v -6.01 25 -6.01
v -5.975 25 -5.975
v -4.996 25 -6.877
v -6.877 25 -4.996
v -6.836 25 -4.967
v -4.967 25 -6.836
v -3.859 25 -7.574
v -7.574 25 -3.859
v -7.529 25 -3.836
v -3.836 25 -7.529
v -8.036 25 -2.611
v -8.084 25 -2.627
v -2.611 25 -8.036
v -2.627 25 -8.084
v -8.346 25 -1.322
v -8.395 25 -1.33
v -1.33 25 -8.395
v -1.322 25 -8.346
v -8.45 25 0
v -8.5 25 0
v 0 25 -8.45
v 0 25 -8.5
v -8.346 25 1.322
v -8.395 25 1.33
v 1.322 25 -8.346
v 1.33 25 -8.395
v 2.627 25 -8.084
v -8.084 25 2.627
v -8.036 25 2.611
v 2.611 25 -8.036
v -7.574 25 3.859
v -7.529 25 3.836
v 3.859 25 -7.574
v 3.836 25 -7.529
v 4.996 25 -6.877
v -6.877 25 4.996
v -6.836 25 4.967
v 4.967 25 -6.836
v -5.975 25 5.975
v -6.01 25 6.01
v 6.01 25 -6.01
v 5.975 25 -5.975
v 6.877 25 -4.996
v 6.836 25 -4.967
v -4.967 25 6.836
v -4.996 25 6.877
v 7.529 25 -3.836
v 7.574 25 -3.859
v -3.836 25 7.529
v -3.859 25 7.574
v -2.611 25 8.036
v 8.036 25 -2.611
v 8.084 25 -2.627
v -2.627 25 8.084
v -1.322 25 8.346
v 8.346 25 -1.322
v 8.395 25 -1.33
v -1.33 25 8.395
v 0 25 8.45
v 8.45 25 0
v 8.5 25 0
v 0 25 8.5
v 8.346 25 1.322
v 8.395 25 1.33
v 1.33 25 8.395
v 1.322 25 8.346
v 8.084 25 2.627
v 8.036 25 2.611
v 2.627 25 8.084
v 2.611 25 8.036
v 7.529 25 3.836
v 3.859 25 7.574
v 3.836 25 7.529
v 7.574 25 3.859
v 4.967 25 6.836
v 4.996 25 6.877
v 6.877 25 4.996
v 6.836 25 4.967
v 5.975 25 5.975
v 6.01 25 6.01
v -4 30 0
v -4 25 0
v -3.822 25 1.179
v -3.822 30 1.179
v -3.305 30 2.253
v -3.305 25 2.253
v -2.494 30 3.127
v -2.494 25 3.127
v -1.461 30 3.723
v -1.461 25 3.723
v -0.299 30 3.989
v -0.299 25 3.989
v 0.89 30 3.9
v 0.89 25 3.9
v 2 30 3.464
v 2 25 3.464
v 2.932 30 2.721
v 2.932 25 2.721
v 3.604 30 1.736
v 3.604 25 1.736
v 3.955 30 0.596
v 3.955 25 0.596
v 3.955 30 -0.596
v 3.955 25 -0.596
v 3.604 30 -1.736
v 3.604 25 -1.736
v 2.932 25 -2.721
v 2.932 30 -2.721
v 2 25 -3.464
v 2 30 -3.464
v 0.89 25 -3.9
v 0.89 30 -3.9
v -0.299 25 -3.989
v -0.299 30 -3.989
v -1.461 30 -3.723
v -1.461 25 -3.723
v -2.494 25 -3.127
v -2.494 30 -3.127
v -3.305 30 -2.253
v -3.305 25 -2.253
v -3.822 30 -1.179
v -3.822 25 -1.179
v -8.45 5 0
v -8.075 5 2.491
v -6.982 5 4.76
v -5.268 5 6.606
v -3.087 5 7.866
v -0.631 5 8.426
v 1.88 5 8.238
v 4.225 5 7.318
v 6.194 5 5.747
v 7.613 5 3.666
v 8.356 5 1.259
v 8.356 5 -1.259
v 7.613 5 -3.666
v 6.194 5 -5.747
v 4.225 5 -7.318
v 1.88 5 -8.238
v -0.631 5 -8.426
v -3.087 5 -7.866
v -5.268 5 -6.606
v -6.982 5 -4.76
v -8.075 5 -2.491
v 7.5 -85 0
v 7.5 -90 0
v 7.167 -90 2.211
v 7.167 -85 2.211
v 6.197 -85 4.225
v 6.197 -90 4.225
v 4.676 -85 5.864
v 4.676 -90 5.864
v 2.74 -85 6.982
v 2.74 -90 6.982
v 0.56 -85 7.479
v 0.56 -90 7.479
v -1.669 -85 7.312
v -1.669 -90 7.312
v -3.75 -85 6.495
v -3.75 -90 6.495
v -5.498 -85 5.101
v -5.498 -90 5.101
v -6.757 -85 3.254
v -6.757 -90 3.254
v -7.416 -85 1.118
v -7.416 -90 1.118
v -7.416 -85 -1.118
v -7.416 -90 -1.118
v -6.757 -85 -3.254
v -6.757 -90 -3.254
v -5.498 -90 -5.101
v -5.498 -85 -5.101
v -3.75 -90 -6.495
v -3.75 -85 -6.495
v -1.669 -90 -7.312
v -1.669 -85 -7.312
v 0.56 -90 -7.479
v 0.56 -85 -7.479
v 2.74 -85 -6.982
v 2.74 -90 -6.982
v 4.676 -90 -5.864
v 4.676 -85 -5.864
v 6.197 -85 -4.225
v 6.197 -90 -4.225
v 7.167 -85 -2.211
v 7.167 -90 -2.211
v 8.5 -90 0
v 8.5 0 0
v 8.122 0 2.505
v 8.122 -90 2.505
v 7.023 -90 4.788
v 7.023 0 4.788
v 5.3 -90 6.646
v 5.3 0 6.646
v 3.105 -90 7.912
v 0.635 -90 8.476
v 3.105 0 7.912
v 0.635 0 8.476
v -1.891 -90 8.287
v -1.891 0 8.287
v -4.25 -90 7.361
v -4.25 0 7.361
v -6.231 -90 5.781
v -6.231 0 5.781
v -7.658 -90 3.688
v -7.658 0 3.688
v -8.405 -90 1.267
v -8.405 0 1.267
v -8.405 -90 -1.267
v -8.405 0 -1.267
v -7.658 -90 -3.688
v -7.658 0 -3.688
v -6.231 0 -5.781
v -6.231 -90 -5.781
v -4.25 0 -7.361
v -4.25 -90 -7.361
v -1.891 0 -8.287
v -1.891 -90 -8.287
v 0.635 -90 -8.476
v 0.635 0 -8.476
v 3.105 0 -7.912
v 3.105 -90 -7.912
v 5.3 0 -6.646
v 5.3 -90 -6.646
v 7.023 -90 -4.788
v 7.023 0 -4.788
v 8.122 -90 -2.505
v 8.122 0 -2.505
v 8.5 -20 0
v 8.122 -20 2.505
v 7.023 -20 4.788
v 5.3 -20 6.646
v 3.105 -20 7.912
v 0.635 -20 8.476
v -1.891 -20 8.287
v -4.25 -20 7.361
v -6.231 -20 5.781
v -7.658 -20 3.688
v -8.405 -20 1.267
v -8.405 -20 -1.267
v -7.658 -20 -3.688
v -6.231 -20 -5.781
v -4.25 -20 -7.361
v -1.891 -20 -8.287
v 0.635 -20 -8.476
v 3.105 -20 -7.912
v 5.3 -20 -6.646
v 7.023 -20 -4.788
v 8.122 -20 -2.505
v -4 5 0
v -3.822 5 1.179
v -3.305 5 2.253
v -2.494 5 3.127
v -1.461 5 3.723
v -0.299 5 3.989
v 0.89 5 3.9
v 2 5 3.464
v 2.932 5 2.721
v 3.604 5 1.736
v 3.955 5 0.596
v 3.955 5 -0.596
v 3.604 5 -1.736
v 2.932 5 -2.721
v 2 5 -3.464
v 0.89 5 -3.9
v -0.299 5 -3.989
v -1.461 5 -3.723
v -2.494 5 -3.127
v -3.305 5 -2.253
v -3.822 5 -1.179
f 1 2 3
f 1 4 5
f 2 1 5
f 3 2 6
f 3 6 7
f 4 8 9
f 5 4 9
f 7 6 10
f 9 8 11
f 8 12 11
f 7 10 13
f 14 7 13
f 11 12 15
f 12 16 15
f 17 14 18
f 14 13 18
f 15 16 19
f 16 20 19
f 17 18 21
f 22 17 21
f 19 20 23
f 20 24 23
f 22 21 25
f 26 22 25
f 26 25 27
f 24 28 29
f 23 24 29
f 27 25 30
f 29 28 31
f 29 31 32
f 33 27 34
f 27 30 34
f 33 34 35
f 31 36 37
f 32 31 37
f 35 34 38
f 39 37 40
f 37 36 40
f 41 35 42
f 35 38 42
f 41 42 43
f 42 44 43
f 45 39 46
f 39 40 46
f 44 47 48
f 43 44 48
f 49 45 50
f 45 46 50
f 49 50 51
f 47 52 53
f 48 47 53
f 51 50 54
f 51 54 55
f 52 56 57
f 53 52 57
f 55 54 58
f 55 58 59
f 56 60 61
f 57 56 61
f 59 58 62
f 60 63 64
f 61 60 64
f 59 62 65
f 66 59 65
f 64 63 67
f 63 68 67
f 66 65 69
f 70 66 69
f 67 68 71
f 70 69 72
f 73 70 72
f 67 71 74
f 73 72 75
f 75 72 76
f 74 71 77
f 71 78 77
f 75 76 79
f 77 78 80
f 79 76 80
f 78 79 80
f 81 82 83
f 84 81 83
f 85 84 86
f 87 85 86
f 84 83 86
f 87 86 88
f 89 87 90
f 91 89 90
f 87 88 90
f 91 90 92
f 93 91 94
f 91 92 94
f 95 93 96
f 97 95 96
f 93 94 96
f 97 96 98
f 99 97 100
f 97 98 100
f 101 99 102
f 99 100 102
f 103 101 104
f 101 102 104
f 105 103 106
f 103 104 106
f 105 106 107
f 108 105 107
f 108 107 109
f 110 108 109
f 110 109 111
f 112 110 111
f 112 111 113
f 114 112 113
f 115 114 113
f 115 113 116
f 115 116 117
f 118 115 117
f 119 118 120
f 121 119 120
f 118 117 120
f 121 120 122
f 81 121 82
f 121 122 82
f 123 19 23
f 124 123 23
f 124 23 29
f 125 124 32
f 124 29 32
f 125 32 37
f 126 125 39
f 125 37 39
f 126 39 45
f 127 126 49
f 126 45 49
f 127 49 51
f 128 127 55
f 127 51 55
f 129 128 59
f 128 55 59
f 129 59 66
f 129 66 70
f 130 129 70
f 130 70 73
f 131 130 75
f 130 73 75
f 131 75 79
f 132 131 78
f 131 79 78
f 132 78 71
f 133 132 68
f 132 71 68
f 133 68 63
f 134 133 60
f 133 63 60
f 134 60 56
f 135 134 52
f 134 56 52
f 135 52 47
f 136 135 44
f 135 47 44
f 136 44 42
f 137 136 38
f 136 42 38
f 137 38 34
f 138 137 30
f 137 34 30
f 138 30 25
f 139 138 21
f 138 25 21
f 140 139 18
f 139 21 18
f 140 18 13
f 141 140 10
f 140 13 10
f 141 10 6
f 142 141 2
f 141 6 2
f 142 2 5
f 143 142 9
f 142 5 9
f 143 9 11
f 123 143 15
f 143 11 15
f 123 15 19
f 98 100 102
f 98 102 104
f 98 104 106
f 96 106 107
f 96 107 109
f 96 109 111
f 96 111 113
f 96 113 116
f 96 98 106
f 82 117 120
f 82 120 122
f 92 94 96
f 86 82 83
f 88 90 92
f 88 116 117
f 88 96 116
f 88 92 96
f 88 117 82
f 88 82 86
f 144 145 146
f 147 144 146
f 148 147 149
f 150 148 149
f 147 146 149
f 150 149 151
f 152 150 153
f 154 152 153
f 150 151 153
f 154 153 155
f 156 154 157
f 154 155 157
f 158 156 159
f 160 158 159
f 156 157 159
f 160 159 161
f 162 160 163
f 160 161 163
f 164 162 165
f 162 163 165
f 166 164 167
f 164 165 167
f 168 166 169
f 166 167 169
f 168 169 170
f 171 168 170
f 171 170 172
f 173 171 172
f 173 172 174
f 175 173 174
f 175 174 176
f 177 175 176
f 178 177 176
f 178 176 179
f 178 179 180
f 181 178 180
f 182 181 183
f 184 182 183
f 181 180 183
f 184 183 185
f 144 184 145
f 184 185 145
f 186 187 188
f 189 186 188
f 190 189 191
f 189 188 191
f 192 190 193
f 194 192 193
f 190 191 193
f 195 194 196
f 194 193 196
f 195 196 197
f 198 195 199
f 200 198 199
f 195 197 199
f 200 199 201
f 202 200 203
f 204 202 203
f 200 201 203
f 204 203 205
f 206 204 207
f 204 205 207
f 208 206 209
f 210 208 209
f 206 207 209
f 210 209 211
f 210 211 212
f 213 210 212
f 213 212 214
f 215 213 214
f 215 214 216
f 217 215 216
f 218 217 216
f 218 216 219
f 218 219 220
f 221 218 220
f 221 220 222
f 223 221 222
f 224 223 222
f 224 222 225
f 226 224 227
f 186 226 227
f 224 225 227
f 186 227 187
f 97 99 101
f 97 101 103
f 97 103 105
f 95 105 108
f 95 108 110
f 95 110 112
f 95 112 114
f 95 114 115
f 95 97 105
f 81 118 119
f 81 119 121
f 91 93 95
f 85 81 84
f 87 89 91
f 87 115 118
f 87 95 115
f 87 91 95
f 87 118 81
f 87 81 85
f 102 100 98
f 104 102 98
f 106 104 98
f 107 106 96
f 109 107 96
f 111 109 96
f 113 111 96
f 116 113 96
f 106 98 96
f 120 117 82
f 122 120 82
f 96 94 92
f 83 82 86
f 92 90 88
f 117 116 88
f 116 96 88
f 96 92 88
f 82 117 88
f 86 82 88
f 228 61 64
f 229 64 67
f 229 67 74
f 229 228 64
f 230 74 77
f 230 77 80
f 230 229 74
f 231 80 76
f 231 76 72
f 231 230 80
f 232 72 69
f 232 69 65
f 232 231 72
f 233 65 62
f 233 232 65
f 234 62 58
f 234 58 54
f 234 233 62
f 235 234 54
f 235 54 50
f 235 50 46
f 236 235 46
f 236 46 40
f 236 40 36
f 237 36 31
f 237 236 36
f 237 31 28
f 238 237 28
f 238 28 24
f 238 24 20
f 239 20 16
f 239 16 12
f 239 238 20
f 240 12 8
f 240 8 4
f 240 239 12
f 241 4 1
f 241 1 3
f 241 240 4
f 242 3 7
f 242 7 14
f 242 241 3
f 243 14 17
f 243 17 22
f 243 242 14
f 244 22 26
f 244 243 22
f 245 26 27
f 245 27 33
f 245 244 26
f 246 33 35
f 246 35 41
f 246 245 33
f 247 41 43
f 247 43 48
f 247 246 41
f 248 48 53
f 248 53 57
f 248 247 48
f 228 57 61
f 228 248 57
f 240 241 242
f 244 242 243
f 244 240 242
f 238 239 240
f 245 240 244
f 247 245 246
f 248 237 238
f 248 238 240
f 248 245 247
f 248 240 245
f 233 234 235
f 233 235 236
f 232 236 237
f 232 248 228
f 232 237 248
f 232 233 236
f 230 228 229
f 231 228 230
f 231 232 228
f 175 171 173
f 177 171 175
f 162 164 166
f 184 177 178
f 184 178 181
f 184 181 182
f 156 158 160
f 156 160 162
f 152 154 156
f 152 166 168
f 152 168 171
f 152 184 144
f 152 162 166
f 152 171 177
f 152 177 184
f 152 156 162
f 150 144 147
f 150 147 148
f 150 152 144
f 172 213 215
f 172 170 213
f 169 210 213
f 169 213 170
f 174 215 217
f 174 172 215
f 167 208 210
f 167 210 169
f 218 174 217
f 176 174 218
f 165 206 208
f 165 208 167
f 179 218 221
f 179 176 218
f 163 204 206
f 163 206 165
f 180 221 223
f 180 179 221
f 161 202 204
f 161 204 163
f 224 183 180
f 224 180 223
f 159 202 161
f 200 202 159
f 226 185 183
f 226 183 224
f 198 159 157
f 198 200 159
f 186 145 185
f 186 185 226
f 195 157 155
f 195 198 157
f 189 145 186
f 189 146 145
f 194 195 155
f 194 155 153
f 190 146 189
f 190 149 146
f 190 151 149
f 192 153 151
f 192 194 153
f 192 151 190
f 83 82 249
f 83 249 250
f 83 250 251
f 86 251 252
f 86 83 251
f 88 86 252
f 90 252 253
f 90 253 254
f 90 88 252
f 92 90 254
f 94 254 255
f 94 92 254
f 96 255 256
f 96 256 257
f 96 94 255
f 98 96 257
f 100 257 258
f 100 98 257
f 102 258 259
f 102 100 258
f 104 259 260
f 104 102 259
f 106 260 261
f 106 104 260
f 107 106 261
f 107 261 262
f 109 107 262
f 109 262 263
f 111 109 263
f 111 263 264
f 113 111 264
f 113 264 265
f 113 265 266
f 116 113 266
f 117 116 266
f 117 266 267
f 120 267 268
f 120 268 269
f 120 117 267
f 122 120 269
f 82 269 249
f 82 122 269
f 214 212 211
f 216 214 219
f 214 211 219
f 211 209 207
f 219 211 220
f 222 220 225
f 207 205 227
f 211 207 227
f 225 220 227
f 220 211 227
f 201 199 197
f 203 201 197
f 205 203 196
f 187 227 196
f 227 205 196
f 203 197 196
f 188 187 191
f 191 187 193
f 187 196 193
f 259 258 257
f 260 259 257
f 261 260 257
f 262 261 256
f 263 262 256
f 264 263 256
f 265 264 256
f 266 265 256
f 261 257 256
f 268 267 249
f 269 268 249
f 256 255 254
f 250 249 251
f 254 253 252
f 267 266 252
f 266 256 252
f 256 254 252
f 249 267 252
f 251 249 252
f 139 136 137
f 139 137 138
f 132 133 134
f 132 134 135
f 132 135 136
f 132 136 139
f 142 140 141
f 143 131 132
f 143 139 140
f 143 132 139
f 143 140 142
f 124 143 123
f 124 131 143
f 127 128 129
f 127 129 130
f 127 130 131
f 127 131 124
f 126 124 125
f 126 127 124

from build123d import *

# Parameters (mm, degrees)
F0_R          = 8.5
F1_DEPTH      = 90
F2_R          = 8.5
F3_DEPTH      = 20
F3_DEPTH_BACK = 25
F4_R          = 4
F5_DEPTH      = 5
F6_R          = 8.45
F7_DEPTH      = 20
F8_DEPTH      = 20
F10_R         = 7.5
F11_DEPTH     = 5


# Not quite as in the source:
# - the program builds the solid bodies; features that only make, move or delete a surface that nothing else refers to are left out


with BuildPart() as f1:
    # F0 (on Front) → F1 (new body)
    with BuildSketch(Plane.XZ):
        Circle(F0_R)
    extrude(amount=F1_DEPTH)

    # F10 (on face) → F11 (cut)
    with BuildSketch(Plane.XZ.offset(90)):
        Circle(F10_R)
    extrude(amount=-F11_DEPTH, mode=Mode.SUBTRACT)


with BuildPart() as f3:
    # F2 (on Front) → F3 (new body, two sides)
    with BuildSketch(Plane.XZ) as f3_sk:
        Circle(F2_R)
    extrude(amount=F3_DEPTH)
    extrude(f3_sk.sketch, amount=-F3_DEPTH_BACK)

    # F6 (on face) → F7 (cut)
    with BuildSketch(Plane(origin=(0, 25, 0), x_dir=(-1, 0, 0), z_dir=(0, 1, 0))):
        Circle(F6_R)
    extrude(amount=-F7_DEPTH, mode=Mode.SUBTRACT)


with BuildPart() as f5:
    # F4 (on face) → F5 (new body)
    with BuildSketch(Plane(origin=(0, 25, 0), x_dir=(-1, 0, 0), z_dir=(0, 1, 0))):
        Circle(F4_R)
    extrude(amount=F5_DEPTH)


with BuildPart() as f8:
    # F4 (on face) → F8 (new body)
    with BuildSketch(Plane(origin=(0, 25, 0), x_dir=(-1, 0, 0), z_dir=(0, 1, 0))):
        Circle(F4_R)
    extrude(amount=-F8_DEPTH)


solid = Compound([f1.part, f3.part, f5.part, f8.part])
